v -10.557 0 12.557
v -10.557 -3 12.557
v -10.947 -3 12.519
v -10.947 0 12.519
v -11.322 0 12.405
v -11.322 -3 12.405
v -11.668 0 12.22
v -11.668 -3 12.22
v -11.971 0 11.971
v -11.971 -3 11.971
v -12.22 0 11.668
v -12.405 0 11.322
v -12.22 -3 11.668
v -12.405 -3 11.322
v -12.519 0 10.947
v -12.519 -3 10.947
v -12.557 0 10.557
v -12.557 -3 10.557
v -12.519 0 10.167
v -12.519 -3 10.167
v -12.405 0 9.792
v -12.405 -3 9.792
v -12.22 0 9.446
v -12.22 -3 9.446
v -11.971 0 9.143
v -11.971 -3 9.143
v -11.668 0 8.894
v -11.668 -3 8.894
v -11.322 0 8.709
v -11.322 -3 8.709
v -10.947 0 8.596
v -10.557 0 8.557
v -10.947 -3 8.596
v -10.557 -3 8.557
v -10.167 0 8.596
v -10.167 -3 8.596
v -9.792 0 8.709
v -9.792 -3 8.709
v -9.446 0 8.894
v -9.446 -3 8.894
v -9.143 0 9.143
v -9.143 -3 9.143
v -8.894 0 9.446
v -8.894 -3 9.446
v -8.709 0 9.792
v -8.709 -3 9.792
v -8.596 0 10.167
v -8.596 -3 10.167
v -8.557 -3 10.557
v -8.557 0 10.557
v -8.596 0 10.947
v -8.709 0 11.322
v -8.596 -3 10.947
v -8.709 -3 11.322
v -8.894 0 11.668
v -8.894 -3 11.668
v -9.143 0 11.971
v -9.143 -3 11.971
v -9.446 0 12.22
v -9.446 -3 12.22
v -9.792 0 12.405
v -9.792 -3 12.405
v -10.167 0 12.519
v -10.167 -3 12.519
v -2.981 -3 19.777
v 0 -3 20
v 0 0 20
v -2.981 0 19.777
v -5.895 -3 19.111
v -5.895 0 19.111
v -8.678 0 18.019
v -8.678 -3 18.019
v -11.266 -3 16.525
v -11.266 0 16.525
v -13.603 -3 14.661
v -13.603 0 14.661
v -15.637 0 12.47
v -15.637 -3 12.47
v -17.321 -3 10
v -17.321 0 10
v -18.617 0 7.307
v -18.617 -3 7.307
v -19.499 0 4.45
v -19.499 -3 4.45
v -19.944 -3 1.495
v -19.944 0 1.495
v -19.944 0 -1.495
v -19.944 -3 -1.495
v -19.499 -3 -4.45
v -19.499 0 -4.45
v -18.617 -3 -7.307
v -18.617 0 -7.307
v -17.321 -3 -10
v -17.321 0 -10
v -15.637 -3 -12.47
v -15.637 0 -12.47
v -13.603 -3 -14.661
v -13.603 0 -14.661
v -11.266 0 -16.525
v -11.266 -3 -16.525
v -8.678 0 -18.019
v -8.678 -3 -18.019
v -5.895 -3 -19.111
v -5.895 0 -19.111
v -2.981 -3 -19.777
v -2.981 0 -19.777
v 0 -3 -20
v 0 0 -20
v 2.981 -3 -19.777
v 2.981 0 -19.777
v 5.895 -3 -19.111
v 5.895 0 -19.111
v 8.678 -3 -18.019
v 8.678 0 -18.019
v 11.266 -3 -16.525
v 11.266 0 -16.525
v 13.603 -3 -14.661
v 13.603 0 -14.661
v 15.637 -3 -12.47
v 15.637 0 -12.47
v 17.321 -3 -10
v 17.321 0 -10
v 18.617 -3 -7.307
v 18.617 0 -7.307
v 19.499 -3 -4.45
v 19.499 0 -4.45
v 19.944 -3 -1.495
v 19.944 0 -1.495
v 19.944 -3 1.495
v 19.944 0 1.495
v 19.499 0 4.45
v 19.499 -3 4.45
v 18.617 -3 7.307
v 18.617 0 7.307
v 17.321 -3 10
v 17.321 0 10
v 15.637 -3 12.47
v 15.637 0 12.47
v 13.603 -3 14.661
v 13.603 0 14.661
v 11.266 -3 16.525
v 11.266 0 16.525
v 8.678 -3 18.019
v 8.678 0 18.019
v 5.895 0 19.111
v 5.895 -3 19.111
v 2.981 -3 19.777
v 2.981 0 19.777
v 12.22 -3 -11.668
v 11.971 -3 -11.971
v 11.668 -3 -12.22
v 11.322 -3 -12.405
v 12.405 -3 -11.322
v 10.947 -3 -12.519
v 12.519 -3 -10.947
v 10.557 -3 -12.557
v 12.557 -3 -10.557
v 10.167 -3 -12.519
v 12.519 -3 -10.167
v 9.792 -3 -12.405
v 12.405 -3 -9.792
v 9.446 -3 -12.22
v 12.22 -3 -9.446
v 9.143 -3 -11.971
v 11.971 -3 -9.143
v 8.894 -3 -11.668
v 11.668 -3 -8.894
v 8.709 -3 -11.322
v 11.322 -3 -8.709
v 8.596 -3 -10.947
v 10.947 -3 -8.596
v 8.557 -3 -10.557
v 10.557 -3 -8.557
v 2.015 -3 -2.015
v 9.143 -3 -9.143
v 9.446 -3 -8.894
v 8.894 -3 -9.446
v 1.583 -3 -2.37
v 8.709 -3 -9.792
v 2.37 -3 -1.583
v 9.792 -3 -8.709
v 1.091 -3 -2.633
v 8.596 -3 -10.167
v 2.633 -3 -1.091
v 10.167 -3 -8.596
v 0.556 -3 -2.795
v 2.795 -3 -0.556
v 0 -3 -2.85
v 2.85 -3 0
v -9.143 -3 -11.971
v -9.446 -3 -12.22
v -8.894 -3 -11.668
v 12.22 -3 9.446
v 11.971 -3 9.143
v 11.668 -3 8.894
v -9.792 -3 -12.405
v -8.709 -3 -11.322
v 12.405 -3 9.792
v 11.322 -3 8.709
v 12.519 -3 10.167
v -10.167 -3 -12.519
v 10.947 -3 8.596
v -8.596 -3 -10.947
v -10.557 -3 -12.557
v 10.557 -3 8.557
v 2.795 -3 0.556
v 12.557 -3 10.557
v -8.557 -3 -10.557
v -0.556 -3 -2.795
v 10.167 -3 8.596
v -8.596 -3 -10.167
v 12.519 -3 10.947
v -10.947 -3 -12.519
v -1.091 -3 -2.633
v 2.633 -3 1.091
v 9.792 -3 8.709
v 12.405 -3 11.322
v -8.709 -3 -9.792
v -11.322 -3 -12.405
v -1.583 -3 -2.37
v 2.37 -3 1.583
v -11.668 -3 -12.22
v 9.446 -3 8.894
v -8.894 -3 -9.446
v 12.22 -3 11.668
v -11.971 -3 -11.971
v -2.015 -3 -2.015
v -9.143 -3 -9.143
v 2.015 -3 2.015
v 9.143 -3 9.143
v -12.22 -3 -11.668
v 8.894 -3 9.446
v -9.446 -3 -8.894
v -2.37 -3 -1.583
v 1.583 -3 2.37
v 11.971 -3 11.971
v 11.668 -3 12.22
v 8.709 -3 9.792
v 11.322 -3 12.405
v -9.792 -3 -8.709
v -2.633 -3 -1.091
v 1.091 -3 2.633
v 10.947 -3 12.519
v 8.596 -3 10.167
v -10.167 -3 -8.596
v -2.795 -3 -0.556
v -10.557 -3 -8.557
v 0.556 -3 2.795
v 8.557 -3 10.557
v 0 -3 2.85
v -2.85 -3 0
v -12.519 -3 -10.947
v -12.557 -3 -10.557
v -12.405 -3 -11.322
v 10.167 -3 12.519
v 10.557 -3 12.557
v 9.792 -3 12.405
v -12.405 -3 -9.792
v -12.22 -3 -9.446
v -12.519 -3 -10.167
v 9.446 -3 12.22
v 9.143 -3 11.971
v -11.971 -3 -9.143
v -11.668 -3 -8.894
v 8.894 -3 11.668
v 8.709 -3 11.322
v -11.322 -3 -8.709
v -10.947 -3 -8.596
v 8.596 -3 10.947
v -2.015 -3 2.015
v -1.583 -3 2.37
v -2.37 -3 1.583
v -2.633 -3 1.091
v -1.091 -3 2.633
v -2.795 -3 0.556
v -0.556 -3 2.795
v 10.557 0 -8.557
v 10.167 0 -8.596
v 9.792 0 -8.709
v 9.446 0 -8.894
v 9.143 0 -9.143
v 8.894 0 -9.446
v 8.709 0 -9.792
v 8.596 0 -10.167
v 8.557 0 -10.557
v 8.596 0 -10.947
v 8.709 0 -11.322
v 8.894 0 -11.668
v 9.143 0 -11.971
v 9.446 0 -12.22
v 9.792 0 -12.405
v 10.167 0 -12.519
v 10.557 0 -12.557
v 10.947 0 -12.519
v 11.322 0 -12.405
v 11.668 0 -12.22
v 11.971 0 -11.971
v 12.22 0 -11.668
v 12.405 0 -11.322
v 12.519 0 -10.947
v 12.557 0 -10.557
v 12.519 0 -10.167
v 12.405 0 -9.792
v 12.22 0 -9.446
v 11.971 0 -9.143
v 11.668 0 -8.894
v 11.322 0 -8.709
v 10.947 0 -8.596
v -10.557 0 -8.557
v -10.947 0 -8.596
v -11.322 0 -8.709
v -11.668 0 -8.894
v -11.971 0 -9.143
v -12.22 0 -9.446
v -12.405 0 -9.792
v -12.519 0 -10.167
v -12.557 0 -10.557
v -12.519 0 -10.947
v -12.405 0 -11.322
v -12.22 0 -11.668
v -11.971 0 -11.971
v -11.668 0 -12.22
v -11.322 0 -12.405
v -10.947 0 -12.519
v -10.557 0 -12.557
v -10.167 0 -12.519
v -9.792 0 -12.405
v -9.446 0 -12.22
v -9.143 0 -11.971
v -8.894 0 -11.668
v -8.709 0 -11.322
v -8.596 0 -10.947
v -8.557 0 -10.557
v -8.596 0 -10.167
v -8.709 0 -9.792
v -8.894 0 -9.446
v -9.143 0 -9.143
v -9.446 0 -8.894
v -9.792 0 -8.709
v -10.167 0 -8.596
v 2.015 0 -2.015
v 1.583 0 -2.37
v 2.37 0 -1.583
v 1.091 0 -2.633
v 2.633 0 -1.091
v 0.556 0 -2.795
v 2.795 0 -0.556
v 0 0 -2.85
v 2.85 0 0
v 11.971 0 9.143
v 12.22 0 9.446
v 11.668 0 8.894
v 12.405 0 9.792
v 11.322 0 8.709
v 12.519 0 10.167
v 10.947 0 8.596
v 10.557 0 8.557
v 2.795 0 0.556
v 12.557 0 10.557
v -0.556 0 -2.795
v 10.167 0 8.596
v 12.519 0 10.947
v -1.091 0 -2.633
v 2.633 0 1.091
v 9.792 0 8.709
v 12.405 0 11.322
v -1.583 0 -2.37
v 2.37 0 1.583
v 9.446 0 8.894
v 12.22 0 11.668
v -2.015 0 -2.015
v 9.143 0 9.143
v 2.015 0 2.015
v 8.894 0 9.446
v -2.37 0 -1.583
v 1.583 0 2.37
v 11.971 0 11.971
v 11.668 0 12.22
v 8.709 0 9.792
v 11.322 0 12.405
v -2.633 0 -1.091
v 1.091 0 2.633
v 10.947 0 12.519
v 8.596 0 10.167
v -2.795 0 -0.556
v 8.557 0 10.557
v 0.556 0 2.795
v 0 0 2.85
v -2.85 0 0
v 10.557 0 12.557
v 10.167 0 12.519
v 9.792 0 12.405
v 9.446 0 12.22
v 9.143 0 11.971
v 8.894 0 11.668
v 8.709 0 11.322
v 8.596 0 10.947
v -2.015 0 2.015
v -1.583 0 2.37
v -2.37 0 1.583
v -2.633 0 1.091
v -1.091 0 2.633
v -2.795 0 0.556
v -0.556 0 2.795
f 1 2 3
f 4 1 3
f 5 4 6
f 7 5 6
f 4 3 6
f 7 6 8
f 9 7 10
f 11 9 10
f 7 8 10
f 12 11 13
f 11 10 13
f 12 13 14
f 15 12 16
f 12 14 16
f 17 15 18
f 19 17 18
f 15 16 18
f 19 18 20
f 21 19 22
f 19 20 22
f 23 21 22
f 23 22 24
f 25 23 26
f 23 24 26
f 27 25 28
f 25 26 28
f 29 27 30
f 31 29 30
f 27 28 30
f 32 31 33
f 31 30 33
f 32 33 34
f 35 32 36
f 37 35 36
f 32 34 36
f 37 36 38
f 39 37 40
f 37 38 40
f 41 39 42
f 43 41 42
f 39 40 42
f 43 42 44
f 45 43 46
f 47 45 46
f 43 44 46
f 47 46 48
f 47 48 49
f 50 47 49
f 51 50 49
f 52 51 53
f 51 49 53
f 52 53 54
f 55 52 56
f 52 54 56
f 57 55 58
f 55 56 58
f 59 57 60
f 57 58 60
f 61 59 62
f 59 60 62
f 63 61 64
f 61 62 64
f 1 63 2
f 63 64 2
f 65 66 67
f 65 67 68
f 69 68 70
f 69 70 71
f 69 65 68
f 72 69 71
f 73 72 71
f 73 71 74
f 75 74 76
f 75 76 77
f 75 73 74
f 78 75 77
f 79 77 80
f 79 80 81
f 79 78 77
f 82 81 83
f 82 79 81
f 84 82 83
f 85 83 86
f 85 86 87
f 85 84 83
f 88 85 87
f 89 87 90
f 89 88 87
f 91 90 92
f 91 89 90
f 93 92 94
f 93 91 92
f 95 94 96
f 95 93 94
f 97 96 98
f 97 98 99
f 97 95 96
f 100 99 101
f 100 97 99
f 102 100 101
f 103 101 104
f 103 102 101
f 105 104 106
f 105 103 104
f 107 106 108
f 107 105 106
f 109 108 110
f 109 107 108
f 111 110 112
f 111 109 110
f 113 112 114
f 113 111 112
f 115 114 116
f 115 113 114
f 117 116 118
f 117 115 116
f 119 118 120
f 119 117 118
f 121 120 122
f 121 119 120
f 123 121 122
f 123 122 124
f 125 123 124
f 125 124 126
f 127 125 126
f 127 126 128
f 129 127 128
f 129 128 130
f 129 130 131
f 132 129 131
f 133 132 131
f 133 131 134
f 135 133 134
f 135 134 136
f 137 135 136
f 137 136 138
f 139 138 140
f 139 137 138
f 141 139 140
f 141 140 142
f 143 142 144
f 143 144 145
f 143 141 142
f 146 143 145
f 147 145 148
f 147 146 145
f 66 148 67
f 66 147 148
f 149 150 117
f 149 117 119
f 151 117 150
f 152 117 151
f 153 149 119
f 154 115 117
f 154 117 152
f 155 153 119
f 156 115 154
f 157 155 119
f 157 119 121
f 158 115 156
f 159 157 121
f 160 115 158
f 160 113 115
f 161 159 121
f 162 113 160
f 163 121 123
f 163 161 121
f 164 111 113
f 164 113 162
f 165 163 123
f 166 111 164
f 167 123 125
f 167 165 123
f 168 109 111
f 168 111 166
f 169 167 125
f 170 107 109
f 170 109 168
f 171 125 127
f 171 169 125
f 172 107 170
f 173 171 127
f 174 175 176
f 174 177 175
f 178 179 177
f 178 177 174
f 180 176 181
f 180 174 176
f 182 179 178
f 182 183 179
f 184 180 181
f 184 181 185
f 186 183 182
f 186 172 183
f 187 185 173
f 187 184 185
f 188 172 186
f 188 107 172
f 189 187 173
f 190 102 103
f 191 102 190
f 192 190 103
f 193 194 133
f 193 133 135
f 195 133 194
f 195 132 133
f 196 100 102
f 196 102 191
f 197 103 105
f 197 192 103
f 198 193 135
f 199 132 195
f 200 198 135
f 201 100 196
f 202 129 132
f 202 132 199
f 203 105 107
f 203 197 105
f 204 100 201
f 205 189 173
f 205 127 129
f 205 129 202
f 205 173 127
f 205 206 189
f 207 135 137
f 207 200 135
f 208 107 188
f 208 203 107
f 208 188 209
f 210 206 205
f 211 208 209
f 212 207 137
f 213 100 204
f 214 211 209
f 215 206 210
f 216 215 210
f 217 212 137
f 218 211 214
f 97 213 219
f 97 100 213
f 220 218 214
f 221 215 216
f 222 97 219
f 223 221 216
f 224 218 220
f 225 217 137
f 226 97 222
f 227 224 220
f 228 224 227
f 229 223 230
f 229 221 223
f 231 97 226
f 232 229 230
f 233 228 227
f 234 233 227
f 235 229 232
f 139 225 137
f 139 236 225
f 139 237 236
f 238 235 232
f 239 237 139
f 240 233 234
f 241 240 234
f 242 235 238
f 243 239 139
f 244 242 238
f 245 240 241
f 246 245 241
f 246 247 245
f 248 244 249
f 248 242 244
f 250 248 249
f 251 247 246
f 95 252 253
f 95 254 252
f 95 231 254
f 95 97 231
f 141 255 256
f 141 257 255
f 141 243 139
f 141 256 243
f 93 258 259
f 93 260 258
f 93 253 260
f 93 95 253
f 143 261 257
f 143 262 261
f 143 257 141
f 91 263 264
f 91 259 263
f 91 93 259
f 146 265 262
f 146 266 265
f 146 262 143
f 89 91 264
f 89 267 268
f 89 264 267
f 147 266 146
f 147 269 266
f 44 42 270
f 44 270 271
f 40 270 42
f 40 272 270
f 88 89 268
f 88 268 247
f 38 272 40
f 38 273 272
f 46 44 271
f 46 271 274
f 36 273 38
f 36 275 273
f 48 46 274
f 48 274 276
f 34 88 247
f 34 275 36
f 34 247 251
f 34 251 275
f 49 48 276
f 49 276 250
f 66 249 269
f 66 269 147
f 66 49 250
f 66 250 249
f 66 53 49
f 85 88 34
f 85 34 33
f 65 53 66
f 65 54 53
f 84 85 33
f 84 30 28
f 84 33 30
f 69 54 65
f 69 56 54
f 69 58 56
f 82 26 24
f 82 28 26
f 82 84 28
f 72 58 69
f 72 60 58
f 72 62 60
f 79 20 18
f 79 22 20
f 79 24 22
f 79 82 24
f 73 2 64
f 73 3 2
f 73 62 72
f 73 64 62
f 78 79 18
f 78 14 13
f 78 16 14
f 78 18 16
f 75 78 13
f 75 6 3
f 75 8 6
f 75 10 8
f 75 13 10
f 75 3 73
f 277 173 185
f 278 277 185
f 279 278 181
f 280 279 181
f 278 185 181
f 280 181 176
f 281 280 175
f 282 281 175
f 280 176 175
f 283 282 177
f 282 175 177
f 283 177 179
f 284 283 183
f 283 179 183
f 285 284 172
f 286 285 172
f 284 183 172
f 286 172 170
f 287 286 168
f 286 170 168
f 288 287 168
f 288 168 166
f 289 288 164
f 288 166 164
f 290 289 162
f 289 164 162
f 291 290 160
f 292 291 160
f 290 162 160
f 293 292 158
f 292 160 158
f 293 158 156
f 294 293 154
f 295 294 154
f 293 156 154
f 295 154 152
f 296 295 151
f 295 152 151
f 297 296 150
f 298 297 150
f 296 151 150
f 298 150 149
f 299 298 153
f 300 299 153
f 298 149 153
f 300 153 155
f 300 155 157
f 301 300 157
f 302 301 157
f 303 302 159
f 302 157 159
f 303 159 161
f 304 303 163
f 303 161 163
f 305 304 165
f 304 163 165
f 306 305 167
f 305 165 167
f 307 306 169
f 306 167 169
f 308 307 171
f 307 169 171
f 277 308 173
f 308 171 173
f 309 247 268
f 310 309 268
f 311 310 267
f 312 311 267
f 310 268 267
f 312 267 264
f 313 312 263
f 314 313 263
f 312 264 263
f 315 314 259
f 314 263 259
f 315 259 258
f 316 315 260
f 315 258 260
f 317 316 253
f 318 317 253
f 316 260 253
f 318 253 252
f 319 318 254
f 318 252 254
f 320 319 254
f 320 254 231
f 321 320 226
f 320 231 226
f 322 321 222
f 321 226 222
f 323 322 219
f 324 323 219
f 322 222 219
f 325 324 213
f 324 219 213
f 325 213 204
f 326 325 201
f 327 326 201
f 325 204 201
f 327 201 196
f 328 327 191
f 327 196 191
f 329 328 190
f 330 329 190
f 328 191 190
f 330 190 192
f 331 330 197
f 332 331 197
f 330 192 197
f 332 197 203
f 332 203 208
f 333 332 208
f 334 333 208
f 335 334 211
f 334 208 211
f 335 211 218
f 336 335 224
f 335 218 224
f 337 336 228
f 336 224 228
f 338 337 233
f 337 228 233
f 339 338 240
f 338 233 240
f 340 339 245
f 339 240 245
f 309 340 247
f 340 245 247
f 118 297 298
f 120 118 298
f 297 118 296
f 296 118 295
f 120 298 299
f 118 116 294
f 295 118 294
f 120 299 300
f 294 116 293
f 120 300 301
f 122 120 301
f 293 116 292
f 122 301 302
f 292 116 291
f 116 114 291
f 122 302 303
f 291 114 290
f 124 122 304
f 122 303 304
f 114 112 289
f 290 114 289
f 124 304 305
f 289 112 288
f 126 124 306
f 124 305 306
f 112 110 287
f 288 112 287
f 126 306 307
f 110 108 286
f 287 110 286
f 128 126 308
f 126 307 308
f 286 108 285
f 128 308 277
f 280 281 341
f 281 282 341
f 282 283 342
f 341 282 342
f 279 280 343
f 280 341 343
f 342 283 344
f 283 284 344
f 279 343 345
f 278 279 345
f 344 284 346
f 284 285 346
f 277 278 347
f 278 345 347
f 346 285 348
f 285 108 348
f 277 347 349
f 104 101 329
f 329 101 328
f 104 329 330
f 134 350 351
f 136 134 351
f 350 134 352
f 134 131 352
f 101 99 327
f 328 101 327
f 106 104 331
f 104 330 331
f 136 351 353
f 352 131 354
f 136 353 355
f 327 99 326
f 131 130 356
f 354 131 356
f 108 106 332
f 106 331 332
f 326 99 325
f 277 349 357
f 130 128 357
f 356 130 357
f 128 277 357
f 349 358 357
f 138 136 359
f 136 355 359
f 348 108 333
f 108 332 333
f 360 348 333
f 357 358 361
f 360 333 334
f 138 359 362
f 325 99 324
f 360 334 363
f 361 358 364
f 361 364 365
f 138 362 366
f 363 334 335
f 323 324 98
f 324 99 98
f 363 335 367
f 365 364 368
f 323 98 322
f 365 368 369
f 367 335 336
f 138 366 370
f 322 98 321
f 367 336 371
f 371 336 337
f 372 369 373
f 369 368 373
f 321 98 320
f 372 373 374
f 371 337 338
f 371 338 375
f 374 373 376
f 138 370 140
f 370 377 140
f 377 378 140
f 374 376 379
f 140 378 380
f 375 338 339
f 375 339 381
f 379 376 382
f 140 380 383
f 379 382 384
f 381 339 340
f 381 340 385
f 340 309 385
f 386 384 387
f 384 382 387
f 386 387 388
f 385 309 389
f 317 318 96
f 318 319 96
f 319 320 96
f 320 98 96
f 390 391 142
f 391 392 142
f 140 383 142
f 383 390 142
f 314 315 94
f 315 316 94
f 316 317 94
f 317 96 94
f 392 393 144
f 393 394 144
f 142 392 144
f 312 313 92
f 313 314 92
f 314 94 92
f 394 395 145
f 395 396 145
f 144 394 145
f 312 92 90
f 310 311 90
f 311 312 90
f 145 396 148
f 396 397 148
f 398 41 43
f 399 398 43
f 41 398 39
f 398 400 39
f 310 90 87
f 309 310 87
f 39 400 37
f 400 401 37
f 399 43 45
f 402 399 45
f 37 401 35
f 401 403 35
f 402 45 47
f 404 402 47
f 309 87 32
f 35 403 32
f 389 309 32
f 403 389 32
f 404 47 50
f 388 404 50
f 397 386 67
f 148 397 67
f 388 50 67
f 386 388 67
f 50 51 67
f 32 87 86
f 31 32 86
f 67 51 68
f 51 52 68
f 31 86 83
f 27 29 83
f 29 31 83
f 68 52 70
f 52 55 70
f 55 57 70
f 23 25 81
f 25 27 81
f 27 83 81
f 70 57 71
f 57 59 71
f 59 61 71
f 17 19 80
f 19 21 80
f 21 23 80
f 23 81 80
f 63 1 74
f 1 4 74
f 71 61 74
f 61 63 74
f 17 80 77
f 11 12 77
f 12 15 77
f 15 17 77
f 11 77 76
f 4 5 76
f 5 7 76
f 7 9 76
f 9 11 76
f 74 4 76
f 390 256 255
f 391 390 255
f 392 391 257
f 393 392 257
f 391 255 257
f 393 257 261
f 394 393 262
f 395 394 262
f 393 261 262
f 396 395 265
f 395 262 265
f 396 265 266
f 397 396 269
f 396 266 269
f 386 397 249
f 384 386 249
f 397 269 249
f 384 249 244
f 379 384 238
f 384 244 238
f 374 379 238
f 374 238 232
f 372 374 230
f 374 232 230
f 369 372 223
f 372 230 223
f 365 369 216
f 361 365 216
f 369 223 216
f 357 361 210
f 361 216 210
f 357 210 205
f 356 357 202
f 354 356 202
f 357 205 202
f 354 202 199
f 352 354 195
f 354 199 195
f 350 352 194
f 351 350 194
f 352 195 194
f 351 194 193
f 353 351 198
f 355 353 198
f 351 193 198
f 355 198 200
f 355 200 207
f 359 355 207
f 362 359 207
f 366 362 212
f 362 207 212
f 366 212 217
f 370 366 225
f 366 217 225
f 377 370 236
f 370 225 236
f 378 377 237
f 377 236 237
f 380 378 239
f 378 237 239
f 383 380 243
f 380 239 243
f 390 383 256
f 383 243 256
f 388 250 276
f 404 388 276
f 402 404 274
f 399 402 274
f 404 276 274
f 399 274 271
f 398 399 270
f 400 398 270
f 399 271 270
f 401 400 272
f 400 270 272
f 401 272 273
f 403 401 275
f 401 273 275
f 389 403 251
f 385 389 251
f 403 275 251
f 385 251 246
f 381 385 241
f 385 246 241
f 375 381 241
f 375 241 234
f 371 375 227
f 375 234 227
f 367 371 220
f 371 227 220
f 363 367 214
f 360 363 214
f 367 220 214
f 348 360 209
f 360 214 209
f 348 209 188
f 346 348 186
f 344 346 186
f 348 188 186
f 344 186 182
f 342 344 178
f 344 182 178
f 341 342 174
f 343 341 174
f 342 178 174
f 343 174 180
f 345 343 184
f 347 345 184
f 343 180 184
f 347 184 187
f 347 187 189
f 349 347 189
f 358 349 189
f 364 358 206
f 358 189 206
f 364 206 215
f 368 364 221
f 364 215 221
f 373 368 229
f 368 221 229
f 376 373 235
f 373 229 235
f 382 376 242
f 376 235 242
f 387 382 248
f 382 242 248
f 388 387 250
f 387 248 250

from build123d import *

# Parameters (mm, degrees)
ESBO_O1_R                = 20
ESBO_O1_R_2              = 2.85
ESBO_O1_R_3              = 2
RESSALTO_EXTRUS_O1_DEPTH = 3


with BuildPart() as part:
    # Esboço1 → Ressalto-extrusão1 (new body)
    with BuildSketch(Plane.XZ.offset(3)):
        with Locations(Location((0, 0, 0), (0, 0, 90))):
            Circle(ESBO_O1_R)
        with Locations(Location((0, 0, 0), (0, 0, 90))):
            Circle(ESBO_O1_R_2, mode=Mode.SUBTRACT)
        with Locations(Location((10.557104243, 10.557104243, 0), (0, 0, 90))):
            Circle(ESBO_O1_R_3, mode=Mode.SUBTRACT)
        with Locations(Location((10.557104243, -10.557104243, 0), (0, 0, 90))):
            Circle(ESBO_O1_R_3, mode=Mode.SUBTRACT)
        with Locations(Location((-10.557104243, -10.557104243, 0), (0, 0, 90))):
            Circle(ESBO_O1_R_3, mode=Mode.SUBTRACT)
        with Locations(Location((-10.557104243, 10.557104243, 0), (0, 0, 90))):
            Circle(ESBO_O1_R_3, mode=Mode.SUBTRACT)
    extrude(amount=-RESSALTO_EXTRUS_O1_DEPTH)


solid = part.part
